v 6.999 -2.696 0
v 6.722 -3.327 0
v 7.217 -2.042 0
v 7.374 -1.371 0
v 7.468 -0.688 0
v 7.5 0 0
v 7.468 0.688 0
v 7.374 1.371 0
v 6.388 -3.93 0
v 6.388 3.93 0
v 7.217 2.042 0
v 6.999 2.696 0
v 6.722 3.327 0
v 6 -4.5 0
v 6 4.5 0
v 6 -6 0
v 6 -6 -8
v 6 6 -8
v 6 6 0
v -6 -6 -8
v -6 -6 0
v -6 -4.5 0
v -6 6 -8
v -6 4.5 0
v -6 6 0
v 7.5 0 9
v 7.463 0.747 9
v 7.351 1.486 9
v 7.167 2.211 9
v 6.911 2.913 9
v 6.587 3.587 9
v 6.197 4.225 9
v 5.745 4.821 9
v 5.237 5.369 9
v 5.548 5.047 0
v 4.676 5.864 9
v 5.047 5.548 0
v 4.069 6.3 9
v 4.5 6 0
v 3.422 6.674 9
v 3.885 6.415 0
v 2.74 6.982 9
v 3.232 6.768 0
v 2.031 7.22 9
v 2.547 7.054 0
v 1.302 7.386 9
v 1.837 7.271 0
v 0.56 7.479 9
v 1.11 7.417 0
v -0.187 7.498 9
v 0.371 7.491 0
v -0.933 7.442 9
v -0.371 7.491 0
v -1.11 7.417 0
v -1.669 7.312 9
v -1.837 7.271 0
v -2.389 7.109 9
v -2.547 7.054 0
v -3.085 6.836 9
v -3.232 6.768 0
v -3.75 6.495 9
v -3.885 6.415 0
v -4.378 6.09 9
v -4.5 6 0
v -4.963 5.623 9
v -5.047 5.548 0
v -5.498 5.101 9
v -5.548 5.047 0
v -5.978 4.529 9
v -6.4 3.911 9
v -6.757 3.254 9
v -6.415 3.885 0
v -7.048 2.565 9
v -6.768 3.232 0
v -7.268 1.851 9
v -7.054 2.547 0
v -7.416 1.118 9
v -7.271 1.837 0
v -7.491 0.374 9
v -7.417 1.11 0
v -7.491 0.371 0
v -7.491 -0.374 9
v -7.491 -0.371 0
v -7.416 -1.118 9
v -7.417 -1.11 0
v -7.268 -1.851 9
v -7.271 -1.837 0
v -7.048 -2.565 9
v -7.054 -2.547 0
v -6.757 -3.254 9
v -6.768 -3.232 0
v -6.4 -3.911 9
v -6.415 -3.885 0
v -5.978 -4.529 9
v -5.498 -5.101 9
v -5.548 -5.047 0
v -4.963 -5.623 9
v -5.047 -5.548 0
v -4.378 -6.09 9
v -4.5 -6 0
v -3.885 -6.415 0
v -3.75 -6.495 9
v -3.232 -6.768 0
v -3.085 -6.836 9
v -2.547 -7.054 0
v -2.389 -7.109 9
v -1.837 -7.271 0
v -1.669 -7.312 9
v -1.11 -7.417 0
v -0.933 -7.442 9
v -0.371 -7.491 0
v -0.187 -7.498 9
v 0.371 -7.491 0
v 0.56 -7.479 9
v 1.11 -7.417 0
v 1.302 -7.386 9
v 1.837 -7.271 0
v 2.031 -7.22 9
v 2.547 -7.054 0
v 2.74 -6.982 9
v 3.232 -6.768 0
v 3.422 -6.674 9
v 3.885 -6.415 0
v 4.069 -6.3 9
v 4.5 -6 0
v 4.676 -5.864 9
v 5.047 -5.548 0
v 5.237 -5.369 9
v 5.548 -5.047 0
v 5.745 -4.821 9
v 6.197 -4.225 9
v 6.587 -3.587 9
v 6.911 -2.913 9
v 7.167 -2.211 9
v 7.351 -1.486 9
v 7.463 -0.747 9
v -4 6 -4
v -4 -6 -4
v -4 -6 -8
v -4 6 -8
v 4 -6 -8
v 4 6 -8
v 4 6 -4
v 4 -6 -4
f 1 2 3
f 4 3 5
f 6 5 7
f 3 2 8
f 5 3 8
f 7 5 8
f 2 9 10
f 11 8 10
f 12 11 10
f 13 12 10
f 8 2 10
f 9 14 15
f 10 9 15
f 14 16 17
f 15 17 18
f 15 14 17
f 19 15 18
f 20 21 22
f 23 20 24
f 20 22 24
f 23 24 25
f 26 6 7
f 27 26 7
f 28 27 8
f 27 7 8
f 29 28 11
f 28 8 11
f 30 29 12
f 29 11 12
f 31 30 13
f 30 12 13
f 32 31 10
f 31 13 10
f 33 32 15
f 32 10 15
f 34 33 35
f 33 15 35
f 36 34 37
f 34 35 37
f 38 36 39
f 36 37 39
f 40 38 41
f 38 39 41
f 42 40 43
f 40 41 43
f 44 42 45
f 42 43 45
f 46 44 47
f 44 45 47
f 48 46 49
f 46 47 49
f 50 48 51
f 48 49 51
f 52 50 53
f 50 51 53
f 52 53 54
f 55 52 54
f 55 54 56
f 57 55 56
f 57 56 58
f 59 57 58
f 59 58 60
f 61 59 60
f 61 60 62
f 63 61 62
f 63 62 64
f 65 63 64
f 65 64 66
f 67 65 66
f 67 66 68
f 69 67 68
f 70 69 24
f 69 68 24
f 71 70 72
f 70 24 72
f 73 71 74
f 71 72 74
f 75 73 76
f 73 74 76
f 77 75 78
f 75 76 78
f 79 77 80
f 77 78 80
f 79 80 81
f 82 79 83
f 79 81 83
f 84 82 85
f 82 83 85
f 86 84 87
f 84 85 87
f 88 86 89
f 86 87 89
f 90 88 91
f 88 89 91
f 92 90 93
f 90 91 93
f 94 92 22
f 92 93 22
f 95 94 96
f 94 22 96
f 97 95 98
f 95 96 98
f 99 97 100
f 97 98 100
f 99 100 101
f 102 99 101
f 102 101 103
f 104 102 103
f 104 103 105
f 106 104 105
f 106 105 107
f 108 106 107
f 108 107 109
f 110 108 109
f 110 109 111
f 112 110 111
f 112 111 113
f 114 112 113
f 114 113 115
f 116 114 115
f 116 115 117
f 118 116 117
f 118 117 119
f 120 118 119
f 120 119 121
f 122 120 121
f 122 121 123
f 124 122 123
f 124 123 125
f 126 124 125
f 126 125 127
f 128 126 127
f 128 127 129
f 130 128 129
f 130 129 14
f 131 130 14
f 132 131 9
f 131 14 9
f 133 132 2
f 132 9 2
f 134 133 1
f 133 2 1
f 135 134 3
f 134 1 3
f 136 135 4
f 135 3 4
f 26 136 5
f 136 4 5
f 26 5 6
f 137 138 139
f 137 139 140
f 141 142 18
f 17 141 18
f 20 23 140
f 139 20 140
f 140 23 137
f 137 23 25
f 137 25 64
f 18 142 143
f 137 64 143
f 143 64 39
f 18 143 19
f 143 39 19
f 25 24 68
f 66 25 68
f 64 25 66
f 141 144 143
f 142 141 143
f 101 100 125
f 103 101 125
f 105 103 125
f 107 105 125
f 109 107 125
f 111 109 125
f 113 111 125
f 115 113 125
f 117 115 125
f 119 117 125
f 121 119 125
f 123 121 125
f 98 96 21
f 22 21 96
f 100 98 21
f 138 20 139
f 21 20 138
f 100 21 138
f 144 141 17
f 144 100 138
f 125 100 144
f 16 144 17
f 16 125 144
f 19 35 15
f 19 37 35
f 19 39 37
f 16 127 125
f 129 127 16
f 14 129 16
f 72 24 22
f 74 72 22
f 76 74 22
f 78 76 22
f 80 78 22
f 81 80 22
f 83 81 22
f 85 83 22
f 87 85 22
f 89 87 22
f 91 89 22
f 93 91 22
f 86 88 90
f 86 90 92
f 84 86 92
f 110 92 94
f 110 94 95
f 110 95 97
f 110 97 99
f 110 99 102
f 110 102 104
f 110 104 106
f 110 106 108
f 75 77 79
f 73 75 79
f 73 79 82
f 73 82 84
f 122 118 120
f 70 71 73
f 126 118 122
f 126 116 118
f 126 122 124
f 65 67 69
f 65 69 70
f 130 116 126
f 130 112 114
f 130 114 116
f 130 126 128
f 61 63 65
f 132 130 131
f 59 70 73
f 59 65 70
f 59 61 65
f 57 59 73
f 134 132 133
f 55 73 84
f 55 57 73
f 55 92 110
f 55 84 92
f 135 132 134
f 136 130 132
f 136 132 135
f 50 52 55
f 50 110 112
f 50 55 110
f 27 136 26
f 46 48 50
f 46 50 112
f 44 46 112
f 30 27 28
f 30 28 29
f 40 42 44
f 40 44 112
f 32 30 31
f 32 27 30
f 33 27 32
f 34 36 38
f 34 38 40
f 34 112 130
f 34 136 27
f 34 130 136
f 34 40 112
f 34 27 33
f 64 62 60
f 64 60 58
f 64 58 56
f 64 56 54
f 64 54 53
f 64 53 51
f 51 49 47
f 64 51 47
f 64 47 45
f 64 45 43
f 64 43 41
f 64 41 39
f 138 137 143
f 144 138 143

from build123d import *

# Parameters (mm, degrees)
F0_W     = 12
F0_H     = 12
F1_DEPTH = 4
F2_W     = 2
F2_H     = 12
F3_DEPTH = 8
F4_R     = 7.5
F5_DEPTH = 9


with BuildPart() as f1:
    # F0 (on Top) → F1 (new body)
    with BuildSketch(Plane.XY):
        Rectangle(F0_W, F0_H)
    extrude(amount=-F1_DEPTH)

    # F2 (on Top) → F3 (join)
    with BuildSketch(Plane.XY):
        with Locations((-5, 0)):
            Rectangle(F2_W, F2_H)
        with Locations((5, 0)):
            Rectangle(F2_W, F2_H)
    extrude(amount=-F3_DEPTH)

    # F4 (on Top) → F5 (join)
    with BuildSketch(Plane.XY):
        Circle(F4_R)
    extrude(amount=F5_DEPTH)


solid = f1.part
